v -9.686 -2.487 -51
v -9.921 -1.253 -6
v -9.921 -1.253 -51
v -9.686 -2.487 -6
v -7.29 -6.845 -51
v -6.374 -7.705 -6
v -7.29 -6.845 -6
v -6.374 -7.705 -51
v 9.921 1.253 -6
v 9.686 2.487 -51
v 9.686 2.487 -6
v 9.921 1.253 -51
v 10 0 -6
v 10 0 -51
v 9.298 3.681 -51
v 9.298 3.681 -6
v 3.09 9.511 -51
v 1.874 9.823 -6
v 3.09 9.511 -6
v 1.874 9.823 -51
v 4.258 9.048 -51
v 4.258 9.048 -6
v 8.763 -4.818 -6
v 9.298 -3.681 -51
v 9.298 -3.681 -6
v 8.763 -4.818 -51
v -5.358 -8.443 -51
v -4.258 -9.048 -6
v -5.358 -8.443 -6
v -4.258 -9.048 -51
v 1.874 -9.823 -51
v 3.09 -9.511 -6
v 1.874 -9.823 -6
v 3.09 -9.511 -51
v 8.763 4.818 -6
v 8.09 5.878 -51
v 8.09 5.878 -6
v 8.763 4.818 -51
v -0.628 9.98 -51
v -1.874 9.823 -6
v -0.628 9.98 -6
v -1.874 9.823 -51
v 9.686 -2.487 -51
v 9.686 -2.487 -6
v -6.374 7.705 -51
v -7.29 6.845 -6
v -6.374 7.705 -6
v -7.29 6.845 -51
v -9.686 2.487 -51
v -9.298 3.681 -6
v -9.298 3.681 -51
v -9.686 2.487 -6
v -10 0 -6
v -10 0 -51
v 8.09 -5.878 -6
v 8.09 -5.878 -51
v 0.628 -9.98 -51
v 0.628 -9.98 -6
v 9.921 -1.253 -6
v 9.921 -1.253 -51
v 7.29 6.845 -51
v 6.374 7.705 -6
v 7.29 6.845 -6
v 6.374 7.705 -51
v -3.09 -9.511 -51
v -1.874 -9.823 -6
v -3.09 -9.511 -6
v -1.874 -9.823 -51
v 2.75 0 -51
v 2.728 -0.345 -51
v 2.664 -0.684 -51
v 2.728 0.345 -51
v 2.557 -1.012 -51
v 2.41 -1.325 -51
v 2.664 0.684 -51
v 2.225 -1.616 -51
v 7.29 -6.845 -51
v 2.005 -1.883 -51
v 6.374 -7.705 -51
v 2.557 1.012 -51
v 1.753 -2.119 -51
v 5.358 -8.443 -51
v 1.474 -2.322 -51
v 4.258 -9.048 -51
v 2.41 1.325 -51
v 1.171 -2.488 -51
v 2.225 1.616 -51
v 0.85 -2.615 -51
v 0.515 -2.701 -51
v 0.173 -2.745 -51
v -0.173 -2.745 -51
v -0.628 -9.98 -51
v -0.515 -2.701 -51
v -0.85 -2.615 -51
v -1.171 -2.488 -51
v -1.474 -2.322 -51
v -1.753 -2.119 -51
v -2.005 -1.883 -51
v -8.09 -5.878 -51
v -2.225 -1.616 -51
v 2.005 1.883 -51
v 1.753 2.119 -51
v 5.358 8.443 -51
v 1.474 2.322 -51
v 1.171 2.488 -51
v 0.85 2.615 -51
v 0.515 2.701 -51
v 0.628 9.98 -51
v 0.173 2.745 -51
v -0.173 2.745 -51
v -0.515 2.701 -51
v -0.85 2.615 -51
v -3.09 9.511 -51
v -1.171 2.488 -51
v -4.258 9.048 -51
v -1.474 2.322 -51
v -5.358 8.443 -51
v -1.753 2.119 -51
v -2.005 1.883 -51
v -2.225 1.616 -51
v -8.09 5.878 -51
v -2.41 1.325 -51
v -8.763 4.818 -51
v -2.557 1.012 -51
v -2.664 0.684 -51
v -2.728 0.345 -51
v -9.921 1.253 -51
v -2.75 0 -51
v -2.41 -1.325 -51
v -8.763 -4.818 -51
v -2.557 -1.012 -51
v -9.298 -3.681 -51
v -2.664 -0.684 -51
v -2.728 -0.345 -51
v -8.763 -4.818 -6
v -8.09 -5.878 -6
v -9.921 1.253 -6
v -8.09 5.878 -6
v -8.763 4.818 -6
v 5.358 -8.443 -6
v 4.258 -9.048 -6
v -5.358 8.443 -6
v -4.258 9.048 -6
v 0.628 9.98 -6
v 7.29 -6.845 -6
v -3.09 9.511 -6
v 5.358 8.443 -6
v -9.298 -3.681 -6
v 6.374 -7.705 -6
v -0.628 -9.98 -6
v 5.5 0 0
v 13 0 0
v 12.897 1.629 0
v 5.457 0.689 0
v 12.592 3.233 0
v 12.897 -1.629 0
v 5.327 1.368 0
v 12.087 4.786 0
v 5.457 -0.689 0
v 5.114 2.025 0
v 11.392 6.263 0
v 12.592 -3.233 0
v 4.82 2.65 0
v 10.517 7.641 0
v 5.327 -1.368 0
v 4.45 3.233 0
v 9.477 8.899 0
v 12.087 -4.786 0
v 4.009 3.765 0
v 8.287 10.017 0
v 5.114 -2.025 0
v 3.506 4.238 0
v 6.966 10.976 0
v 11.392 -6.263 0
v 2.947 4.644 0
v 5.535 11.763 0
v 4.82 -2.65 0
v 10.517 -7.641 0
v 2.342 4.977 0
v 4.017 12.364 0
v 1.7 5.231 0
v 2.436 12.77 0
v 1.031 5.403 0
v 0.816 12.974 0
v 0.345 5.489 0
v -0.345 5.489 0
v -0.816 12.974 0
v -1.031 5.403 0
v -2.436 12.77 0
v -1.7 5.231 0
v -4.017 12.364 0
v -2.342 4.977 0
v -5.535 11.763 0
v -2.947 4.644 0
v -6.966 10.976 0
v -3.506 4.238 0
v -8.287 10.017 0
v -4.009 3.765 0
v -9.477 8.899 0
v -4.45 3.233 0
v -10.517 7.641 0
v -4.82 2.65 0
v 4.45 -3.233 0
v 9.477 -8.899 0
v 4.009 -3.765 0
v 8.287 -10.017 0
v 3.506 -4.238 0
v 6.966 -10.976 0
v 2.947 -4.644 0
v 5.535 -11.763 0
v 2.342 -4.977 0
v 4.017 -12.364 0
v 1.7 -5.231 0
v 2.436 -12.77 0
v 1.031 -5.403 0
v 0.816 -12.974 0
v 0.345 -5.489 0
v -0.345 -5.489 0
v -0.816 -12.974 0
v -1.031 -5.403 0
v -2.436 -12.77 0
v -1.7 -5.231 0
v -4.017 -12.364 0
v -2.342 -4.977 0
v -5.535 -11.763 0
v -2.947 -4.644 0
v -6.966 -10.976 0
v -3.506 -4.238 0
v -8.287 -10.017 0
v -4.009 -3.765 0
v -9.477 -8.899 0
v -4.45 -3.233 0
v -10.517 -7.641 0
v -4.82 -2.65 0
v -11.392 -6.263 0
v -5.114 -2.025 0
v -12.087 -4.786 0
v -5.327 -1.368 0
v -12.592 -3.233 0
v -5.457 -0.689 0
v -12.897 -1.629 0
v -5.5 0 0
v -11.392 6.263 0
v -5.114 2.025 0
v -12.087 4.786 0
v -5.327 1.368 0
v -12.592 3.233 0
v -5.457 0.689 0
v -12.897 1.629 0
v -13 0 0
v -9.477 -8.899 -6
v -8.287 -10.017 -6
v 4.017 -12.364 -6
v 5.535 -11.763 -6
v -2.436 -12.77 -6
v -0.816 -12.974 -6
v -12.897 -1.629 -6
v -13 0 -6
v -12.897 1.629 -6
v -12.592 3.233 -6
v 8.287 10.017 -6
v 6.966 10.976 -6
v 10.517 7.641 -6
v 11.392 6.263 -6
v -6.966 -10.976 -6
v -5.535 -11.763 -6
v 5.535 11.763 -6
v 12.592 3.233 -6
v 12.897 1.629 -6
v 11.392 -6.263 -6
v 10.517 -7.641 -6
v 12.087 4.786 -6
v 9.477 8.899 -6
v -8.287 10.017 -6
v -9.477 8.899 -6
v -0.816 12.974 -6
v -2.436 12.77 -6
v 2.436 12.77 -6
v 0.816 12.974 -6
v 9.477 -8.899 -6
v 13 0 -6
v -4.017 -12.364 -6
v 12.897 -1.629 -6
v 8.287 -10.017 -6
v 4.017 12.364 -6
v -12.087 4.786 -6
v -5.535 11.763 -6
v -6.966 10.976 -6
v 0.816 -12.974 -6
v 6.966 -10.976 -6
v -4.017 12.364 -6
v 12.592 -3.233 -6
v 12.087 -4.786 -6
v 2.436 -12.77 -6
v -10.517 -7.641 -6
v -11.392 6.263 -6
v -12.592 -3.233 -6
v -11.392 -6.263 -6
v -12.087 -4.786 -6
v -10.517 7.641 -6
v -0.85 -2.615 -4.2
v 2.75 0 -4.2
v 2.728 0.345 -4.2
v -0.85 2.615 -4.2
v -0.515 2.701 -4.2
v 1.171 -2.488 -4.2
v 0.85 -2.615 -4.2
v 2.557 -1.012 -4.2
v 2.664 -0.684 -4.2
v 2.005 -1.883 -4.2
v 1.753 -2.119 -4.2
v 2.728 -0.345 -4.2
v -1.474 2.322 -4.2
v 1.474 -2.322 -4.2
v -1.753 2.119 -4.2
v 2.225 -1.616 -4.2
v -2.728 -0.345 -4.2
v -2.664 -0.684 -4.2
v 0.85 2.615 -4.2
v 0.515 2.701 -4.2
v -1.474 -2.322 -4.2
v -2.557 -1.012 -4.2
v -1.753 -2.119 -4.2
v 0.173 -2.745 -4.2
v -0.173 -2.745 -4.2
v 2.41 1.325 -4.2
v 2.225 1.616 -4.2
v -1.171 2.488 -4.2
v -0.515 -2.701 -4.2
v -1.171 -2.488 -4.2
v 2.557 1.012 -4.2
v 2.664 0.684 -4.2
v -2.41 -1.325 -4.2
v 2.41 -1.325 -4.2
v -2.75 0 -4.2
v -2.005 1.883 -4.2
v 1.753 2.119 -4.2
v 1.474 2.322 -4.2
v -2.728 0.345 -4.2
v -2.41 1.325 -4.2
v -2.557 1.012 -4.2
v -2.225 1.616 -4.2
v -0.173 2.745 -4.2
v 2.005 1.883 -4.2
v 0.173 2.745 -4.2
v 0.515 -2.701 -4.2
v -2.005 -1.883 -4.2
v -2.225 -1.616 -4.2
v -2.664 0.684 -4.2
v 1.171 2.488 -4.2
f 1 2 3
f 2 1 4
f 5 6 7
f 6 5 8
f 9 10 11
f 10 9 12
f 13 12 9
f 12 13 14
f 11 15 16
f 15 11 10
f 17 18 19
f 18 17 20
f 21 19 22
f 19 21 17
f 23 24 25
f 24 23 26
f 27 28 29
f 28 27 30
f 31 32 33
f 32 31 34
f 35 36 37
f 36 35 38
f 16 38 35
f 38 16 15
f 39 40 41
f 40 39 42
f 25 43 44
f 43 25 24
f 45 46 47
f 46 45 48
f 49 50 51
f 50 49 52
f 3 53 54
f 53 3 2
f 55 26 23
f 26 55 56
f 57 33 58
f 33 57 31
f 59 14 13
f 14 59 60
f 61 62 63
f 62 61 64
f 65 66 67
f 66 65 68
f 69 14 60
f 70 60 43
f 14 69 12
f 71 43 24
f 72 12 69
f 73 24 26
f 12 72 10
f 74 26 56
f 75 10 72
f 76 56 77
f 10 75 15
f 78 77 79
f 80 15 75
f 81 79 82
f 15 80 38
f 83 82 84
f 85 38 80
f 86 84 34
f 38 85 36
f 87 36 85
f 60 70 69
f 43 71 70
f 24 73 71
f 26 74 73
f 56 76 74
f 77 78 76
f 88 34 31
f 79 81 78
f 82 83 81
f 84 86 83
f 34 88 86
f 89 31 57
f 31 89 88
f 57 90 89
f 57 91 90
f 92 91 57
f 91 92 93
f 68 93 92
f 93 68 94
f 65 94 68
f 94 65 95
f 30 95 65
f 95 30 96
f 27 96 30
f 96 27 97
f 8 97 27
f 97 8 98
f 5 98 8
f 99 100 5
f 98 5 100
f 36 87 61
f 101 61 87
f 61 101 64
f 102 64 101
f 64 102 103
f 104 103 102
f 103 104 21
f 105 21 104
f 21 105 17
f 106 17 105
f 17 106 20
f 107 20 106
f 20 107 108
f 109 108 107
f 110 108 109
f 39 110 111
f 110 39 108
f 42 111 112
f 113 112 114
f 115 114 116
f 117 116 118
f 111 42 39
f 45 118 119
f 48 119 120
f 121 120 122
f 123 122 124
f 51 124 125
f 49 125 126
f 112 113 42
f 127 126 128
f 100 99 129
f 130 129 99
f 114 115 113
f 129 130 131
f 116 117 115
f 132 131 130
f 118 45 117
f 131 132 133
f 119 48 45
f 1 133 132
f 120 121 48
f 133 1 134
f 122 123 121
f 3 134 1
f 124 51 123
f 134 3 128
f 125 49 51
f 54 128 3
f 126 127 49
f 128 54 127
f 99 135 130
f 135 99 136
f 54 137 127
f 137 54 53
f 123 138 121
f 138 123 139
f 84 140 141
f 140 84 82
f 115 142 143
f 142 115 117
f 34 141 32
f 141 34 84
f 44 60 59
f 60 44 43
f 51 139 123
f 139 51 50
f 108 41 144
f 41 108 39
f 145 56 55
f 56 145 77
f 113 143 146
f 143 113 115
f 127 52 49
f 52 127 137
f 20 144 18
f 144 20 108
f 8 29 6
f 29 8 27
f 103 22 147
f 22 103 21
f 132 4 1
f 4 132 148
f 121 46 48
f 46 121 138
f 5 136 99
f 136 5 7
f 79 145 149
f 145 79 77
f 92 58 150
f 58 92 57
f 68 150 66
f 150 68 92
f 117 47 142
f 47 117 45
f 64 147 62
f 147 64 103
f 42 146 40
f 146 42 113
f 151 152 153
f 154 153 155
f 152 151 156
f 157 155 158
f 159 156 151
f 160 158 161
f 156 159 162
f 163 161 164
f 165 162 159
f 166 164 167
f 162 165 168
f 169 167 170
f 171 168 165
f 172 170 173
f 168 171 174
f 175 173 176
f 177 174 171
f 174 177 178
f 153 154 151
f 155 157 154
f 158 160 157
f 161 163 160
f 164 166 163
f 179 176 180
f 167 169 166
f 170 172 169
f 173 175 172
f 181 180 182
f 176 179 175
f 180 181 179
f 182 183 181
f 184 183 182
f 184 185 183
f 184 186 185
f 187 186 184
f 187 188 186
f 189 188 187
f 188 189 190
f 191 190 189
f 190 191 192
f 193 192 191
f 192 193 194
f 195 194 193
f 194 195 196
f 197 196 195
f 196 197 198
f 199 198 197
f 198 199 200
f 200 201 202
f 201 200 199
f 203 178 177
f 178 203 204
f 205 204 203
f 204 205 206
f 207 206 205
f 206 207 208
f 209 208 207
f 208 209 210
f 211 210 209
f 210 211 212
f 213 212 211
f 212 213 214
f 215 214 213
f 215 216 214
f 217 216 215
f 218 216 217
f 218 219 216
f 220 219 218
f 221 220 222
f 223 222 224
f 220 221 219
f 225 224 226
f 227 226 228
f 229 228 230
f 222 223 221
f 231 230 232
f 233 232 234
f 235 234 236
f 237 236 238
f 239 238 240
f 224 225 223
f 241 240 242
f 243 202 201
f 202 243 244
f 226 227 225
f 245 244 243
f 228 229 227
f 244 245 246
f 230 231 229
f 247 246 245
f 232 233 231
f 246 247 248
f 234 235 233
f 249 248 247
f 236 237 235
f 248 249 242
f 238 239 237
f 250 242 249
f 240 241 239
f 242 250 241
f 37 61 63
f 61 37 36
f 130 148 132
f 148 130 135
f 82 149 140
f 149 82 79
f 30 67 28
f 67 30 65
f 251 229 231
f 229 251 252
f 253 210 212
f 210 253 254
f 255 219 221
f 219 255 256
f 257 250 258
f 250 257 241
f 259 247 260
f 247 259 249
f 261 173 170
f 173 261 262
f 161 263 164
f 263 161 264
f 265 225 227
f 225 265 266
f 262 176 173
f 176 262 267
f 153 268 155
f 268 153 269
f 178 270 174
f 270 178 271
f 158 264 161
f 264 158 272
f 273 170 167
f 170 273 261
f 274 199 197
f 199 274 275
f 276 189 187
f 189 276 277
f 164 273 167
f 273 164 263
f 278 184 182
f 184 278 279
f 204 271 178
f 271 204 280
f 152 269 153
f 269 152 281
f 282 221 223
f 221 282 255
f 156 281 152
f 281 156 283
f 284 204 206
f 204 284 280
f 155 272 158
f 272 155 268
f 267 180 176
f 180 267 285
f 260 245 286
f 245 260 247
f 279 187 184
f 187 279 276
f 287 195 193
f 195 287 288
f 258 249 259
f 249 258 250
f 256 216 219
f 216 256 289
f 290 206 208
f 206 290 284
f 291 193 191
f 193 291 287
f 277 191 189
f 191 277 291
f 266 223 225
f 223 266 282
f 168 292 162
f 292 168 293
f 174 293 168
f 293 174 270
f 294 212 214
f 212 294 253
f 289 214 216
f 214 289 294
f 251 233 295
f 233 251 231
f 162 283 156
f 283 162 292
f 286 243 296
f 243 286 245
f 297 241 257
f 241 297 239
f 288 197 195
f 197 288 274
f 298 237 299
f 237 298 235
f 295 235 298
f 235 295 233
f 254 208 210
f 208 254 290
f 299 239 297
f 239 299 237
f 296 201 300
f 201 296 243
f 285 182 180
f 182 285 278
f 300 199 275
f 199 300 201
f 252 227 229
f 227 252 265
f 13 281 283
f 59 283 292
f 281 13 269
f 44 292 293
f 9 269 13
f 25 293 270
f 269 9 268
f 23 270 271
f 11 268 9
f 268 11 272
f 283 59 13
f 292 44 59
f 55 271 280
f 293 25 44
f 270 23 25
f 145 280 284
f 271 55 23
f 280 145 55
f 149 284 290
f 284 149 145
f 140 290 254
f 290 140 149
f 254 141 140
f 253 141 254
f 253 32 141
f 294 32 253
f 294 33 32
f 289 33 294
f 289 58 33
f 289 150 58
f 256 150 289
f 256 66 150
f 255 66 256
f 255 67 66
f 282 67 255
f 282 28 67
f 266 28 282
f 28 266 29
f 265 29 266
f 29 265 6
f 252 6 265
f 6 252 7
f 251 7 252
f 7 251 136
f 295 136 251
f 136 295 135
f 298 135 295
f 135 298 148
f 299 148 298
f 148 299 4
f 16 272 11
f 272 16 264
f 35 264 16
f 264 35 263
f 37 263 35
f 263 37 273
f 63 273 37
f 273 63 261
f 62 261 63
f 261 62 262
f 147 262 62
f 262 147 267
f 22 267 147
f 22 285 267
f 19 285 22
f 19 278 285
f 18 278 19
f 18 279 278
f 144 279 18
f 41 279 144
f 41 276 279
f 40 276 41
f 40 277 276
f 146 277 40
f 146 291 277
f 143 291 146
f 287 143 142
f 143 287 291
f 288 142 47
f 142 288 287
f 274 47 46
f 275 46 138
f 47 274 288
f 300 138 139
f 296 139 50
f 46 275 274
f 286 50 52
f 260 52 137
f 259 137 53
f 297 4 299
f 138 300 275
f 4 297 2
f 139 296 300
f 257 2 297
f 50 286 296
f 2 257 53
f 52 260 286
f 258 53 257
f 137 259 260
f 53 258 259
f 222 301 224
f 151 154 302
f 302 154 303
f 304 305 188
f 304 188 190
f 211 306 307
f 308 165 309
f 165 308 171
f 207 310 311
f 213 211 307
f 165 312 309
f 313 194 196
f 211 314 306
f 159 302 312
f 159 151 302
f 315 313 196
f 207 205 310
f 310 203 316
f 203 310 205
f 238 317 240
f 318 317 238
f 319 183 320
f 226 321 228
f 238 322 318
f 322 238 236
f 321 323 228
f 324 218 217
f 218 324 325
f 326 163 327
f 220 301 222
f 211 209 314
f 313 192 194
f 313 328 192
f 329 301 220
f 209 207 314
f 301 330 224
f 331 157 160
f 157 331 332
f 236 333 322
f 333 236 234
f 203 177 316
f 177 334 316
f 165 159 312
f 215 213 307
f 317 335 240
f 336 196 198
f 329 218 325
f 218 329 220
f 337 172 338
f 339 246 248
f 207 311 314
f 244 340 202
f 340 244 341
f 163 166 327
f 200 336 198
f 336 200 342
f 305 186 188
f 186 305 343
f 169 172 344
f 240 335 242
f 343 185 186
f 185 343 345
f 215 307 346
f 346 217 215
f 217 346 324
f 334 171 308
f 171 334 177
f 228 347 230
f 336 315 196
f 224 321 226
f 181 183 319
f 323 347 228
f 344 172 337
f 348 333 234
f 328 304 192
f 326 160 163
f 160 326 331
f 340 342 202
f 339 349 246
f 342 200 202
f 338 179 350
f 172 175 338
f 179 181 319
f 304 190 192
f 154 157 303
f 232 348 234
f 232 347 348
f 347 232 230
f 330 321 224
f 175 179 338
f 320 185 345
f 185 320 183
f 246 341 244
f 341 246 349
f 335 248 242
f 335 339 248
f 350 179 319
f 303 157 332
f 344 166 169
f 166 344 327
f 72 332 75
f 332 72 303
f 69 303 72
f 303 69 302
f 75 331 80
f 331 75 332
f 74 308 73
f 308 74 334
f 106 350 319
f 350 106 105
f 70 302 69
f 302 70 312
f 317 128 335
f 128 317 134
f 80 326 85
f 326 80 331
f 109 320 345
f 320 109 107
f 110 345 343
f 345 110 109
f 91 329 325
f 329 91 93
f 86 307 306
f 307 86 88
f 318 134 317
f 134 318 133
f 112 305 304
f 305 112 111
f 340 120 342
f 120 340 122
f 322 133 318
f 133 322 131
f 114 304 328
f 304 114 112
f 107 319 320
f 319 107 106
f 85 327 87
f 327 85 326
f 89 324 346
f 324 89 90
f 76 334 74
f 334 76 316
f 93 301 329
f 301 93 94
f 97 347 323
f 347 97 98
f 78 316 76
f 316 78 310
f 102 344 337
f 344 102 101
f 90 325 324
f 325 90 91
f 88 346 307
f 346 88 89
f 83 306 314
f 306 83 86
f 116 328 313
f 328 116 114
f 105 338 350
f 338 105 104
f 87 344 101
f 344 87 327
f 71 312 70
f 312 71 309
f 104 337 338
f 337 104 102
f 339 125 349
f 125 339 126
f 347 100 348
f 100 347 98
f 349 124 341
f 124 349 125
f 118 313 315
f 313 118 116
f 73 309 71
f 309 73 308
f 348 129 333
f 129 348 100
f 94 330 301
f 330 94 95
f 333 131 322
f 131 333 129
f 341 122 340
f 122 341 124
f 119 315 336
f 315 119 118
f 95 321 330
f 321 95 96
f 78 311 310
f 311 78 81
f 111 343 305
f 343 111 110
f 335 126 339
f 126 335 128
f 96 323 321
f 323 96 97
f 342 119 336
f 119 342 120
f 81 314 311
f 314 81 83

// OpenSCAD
$fn = 50;


difference() {
	union() {
		translate(v = [0, 0, -51.0000000000]) {
			cylinder(h = 51, r = 10.0000000000);
		}
		translate(v = [0, 0, -6.0000000000]) {
			cylinder(h = 6, r = 13.0000000000);
		}
	}
	union() {
		translate(v = [0, 0, 0]) {
			rotate(a = [0, 0, 0]) {
				difference() {
					union() {
						#translate(v = [0, 0, -51.0000000000]) {
							cylinder(h = 51, r = 2.2500000000);
						}
						#translate(v = [0, 0, -4.2000000000]) {
							cylinder(h = 4.2000000000, r = 10.0000000000, r1 = 2.7500000000, r2 = 5.5000000000);
						}
						#translate(v = [0, 0, -51.0000000000]) {
							cylinder(h = 51, r = 2.7500000000);
						}
						#translate(v = [0, 0, -51.0000000000]) {
							cylinder(h = 51, r = 2.2500000000);
						}
					}
					union();
				}
			}
		}
	}
}
